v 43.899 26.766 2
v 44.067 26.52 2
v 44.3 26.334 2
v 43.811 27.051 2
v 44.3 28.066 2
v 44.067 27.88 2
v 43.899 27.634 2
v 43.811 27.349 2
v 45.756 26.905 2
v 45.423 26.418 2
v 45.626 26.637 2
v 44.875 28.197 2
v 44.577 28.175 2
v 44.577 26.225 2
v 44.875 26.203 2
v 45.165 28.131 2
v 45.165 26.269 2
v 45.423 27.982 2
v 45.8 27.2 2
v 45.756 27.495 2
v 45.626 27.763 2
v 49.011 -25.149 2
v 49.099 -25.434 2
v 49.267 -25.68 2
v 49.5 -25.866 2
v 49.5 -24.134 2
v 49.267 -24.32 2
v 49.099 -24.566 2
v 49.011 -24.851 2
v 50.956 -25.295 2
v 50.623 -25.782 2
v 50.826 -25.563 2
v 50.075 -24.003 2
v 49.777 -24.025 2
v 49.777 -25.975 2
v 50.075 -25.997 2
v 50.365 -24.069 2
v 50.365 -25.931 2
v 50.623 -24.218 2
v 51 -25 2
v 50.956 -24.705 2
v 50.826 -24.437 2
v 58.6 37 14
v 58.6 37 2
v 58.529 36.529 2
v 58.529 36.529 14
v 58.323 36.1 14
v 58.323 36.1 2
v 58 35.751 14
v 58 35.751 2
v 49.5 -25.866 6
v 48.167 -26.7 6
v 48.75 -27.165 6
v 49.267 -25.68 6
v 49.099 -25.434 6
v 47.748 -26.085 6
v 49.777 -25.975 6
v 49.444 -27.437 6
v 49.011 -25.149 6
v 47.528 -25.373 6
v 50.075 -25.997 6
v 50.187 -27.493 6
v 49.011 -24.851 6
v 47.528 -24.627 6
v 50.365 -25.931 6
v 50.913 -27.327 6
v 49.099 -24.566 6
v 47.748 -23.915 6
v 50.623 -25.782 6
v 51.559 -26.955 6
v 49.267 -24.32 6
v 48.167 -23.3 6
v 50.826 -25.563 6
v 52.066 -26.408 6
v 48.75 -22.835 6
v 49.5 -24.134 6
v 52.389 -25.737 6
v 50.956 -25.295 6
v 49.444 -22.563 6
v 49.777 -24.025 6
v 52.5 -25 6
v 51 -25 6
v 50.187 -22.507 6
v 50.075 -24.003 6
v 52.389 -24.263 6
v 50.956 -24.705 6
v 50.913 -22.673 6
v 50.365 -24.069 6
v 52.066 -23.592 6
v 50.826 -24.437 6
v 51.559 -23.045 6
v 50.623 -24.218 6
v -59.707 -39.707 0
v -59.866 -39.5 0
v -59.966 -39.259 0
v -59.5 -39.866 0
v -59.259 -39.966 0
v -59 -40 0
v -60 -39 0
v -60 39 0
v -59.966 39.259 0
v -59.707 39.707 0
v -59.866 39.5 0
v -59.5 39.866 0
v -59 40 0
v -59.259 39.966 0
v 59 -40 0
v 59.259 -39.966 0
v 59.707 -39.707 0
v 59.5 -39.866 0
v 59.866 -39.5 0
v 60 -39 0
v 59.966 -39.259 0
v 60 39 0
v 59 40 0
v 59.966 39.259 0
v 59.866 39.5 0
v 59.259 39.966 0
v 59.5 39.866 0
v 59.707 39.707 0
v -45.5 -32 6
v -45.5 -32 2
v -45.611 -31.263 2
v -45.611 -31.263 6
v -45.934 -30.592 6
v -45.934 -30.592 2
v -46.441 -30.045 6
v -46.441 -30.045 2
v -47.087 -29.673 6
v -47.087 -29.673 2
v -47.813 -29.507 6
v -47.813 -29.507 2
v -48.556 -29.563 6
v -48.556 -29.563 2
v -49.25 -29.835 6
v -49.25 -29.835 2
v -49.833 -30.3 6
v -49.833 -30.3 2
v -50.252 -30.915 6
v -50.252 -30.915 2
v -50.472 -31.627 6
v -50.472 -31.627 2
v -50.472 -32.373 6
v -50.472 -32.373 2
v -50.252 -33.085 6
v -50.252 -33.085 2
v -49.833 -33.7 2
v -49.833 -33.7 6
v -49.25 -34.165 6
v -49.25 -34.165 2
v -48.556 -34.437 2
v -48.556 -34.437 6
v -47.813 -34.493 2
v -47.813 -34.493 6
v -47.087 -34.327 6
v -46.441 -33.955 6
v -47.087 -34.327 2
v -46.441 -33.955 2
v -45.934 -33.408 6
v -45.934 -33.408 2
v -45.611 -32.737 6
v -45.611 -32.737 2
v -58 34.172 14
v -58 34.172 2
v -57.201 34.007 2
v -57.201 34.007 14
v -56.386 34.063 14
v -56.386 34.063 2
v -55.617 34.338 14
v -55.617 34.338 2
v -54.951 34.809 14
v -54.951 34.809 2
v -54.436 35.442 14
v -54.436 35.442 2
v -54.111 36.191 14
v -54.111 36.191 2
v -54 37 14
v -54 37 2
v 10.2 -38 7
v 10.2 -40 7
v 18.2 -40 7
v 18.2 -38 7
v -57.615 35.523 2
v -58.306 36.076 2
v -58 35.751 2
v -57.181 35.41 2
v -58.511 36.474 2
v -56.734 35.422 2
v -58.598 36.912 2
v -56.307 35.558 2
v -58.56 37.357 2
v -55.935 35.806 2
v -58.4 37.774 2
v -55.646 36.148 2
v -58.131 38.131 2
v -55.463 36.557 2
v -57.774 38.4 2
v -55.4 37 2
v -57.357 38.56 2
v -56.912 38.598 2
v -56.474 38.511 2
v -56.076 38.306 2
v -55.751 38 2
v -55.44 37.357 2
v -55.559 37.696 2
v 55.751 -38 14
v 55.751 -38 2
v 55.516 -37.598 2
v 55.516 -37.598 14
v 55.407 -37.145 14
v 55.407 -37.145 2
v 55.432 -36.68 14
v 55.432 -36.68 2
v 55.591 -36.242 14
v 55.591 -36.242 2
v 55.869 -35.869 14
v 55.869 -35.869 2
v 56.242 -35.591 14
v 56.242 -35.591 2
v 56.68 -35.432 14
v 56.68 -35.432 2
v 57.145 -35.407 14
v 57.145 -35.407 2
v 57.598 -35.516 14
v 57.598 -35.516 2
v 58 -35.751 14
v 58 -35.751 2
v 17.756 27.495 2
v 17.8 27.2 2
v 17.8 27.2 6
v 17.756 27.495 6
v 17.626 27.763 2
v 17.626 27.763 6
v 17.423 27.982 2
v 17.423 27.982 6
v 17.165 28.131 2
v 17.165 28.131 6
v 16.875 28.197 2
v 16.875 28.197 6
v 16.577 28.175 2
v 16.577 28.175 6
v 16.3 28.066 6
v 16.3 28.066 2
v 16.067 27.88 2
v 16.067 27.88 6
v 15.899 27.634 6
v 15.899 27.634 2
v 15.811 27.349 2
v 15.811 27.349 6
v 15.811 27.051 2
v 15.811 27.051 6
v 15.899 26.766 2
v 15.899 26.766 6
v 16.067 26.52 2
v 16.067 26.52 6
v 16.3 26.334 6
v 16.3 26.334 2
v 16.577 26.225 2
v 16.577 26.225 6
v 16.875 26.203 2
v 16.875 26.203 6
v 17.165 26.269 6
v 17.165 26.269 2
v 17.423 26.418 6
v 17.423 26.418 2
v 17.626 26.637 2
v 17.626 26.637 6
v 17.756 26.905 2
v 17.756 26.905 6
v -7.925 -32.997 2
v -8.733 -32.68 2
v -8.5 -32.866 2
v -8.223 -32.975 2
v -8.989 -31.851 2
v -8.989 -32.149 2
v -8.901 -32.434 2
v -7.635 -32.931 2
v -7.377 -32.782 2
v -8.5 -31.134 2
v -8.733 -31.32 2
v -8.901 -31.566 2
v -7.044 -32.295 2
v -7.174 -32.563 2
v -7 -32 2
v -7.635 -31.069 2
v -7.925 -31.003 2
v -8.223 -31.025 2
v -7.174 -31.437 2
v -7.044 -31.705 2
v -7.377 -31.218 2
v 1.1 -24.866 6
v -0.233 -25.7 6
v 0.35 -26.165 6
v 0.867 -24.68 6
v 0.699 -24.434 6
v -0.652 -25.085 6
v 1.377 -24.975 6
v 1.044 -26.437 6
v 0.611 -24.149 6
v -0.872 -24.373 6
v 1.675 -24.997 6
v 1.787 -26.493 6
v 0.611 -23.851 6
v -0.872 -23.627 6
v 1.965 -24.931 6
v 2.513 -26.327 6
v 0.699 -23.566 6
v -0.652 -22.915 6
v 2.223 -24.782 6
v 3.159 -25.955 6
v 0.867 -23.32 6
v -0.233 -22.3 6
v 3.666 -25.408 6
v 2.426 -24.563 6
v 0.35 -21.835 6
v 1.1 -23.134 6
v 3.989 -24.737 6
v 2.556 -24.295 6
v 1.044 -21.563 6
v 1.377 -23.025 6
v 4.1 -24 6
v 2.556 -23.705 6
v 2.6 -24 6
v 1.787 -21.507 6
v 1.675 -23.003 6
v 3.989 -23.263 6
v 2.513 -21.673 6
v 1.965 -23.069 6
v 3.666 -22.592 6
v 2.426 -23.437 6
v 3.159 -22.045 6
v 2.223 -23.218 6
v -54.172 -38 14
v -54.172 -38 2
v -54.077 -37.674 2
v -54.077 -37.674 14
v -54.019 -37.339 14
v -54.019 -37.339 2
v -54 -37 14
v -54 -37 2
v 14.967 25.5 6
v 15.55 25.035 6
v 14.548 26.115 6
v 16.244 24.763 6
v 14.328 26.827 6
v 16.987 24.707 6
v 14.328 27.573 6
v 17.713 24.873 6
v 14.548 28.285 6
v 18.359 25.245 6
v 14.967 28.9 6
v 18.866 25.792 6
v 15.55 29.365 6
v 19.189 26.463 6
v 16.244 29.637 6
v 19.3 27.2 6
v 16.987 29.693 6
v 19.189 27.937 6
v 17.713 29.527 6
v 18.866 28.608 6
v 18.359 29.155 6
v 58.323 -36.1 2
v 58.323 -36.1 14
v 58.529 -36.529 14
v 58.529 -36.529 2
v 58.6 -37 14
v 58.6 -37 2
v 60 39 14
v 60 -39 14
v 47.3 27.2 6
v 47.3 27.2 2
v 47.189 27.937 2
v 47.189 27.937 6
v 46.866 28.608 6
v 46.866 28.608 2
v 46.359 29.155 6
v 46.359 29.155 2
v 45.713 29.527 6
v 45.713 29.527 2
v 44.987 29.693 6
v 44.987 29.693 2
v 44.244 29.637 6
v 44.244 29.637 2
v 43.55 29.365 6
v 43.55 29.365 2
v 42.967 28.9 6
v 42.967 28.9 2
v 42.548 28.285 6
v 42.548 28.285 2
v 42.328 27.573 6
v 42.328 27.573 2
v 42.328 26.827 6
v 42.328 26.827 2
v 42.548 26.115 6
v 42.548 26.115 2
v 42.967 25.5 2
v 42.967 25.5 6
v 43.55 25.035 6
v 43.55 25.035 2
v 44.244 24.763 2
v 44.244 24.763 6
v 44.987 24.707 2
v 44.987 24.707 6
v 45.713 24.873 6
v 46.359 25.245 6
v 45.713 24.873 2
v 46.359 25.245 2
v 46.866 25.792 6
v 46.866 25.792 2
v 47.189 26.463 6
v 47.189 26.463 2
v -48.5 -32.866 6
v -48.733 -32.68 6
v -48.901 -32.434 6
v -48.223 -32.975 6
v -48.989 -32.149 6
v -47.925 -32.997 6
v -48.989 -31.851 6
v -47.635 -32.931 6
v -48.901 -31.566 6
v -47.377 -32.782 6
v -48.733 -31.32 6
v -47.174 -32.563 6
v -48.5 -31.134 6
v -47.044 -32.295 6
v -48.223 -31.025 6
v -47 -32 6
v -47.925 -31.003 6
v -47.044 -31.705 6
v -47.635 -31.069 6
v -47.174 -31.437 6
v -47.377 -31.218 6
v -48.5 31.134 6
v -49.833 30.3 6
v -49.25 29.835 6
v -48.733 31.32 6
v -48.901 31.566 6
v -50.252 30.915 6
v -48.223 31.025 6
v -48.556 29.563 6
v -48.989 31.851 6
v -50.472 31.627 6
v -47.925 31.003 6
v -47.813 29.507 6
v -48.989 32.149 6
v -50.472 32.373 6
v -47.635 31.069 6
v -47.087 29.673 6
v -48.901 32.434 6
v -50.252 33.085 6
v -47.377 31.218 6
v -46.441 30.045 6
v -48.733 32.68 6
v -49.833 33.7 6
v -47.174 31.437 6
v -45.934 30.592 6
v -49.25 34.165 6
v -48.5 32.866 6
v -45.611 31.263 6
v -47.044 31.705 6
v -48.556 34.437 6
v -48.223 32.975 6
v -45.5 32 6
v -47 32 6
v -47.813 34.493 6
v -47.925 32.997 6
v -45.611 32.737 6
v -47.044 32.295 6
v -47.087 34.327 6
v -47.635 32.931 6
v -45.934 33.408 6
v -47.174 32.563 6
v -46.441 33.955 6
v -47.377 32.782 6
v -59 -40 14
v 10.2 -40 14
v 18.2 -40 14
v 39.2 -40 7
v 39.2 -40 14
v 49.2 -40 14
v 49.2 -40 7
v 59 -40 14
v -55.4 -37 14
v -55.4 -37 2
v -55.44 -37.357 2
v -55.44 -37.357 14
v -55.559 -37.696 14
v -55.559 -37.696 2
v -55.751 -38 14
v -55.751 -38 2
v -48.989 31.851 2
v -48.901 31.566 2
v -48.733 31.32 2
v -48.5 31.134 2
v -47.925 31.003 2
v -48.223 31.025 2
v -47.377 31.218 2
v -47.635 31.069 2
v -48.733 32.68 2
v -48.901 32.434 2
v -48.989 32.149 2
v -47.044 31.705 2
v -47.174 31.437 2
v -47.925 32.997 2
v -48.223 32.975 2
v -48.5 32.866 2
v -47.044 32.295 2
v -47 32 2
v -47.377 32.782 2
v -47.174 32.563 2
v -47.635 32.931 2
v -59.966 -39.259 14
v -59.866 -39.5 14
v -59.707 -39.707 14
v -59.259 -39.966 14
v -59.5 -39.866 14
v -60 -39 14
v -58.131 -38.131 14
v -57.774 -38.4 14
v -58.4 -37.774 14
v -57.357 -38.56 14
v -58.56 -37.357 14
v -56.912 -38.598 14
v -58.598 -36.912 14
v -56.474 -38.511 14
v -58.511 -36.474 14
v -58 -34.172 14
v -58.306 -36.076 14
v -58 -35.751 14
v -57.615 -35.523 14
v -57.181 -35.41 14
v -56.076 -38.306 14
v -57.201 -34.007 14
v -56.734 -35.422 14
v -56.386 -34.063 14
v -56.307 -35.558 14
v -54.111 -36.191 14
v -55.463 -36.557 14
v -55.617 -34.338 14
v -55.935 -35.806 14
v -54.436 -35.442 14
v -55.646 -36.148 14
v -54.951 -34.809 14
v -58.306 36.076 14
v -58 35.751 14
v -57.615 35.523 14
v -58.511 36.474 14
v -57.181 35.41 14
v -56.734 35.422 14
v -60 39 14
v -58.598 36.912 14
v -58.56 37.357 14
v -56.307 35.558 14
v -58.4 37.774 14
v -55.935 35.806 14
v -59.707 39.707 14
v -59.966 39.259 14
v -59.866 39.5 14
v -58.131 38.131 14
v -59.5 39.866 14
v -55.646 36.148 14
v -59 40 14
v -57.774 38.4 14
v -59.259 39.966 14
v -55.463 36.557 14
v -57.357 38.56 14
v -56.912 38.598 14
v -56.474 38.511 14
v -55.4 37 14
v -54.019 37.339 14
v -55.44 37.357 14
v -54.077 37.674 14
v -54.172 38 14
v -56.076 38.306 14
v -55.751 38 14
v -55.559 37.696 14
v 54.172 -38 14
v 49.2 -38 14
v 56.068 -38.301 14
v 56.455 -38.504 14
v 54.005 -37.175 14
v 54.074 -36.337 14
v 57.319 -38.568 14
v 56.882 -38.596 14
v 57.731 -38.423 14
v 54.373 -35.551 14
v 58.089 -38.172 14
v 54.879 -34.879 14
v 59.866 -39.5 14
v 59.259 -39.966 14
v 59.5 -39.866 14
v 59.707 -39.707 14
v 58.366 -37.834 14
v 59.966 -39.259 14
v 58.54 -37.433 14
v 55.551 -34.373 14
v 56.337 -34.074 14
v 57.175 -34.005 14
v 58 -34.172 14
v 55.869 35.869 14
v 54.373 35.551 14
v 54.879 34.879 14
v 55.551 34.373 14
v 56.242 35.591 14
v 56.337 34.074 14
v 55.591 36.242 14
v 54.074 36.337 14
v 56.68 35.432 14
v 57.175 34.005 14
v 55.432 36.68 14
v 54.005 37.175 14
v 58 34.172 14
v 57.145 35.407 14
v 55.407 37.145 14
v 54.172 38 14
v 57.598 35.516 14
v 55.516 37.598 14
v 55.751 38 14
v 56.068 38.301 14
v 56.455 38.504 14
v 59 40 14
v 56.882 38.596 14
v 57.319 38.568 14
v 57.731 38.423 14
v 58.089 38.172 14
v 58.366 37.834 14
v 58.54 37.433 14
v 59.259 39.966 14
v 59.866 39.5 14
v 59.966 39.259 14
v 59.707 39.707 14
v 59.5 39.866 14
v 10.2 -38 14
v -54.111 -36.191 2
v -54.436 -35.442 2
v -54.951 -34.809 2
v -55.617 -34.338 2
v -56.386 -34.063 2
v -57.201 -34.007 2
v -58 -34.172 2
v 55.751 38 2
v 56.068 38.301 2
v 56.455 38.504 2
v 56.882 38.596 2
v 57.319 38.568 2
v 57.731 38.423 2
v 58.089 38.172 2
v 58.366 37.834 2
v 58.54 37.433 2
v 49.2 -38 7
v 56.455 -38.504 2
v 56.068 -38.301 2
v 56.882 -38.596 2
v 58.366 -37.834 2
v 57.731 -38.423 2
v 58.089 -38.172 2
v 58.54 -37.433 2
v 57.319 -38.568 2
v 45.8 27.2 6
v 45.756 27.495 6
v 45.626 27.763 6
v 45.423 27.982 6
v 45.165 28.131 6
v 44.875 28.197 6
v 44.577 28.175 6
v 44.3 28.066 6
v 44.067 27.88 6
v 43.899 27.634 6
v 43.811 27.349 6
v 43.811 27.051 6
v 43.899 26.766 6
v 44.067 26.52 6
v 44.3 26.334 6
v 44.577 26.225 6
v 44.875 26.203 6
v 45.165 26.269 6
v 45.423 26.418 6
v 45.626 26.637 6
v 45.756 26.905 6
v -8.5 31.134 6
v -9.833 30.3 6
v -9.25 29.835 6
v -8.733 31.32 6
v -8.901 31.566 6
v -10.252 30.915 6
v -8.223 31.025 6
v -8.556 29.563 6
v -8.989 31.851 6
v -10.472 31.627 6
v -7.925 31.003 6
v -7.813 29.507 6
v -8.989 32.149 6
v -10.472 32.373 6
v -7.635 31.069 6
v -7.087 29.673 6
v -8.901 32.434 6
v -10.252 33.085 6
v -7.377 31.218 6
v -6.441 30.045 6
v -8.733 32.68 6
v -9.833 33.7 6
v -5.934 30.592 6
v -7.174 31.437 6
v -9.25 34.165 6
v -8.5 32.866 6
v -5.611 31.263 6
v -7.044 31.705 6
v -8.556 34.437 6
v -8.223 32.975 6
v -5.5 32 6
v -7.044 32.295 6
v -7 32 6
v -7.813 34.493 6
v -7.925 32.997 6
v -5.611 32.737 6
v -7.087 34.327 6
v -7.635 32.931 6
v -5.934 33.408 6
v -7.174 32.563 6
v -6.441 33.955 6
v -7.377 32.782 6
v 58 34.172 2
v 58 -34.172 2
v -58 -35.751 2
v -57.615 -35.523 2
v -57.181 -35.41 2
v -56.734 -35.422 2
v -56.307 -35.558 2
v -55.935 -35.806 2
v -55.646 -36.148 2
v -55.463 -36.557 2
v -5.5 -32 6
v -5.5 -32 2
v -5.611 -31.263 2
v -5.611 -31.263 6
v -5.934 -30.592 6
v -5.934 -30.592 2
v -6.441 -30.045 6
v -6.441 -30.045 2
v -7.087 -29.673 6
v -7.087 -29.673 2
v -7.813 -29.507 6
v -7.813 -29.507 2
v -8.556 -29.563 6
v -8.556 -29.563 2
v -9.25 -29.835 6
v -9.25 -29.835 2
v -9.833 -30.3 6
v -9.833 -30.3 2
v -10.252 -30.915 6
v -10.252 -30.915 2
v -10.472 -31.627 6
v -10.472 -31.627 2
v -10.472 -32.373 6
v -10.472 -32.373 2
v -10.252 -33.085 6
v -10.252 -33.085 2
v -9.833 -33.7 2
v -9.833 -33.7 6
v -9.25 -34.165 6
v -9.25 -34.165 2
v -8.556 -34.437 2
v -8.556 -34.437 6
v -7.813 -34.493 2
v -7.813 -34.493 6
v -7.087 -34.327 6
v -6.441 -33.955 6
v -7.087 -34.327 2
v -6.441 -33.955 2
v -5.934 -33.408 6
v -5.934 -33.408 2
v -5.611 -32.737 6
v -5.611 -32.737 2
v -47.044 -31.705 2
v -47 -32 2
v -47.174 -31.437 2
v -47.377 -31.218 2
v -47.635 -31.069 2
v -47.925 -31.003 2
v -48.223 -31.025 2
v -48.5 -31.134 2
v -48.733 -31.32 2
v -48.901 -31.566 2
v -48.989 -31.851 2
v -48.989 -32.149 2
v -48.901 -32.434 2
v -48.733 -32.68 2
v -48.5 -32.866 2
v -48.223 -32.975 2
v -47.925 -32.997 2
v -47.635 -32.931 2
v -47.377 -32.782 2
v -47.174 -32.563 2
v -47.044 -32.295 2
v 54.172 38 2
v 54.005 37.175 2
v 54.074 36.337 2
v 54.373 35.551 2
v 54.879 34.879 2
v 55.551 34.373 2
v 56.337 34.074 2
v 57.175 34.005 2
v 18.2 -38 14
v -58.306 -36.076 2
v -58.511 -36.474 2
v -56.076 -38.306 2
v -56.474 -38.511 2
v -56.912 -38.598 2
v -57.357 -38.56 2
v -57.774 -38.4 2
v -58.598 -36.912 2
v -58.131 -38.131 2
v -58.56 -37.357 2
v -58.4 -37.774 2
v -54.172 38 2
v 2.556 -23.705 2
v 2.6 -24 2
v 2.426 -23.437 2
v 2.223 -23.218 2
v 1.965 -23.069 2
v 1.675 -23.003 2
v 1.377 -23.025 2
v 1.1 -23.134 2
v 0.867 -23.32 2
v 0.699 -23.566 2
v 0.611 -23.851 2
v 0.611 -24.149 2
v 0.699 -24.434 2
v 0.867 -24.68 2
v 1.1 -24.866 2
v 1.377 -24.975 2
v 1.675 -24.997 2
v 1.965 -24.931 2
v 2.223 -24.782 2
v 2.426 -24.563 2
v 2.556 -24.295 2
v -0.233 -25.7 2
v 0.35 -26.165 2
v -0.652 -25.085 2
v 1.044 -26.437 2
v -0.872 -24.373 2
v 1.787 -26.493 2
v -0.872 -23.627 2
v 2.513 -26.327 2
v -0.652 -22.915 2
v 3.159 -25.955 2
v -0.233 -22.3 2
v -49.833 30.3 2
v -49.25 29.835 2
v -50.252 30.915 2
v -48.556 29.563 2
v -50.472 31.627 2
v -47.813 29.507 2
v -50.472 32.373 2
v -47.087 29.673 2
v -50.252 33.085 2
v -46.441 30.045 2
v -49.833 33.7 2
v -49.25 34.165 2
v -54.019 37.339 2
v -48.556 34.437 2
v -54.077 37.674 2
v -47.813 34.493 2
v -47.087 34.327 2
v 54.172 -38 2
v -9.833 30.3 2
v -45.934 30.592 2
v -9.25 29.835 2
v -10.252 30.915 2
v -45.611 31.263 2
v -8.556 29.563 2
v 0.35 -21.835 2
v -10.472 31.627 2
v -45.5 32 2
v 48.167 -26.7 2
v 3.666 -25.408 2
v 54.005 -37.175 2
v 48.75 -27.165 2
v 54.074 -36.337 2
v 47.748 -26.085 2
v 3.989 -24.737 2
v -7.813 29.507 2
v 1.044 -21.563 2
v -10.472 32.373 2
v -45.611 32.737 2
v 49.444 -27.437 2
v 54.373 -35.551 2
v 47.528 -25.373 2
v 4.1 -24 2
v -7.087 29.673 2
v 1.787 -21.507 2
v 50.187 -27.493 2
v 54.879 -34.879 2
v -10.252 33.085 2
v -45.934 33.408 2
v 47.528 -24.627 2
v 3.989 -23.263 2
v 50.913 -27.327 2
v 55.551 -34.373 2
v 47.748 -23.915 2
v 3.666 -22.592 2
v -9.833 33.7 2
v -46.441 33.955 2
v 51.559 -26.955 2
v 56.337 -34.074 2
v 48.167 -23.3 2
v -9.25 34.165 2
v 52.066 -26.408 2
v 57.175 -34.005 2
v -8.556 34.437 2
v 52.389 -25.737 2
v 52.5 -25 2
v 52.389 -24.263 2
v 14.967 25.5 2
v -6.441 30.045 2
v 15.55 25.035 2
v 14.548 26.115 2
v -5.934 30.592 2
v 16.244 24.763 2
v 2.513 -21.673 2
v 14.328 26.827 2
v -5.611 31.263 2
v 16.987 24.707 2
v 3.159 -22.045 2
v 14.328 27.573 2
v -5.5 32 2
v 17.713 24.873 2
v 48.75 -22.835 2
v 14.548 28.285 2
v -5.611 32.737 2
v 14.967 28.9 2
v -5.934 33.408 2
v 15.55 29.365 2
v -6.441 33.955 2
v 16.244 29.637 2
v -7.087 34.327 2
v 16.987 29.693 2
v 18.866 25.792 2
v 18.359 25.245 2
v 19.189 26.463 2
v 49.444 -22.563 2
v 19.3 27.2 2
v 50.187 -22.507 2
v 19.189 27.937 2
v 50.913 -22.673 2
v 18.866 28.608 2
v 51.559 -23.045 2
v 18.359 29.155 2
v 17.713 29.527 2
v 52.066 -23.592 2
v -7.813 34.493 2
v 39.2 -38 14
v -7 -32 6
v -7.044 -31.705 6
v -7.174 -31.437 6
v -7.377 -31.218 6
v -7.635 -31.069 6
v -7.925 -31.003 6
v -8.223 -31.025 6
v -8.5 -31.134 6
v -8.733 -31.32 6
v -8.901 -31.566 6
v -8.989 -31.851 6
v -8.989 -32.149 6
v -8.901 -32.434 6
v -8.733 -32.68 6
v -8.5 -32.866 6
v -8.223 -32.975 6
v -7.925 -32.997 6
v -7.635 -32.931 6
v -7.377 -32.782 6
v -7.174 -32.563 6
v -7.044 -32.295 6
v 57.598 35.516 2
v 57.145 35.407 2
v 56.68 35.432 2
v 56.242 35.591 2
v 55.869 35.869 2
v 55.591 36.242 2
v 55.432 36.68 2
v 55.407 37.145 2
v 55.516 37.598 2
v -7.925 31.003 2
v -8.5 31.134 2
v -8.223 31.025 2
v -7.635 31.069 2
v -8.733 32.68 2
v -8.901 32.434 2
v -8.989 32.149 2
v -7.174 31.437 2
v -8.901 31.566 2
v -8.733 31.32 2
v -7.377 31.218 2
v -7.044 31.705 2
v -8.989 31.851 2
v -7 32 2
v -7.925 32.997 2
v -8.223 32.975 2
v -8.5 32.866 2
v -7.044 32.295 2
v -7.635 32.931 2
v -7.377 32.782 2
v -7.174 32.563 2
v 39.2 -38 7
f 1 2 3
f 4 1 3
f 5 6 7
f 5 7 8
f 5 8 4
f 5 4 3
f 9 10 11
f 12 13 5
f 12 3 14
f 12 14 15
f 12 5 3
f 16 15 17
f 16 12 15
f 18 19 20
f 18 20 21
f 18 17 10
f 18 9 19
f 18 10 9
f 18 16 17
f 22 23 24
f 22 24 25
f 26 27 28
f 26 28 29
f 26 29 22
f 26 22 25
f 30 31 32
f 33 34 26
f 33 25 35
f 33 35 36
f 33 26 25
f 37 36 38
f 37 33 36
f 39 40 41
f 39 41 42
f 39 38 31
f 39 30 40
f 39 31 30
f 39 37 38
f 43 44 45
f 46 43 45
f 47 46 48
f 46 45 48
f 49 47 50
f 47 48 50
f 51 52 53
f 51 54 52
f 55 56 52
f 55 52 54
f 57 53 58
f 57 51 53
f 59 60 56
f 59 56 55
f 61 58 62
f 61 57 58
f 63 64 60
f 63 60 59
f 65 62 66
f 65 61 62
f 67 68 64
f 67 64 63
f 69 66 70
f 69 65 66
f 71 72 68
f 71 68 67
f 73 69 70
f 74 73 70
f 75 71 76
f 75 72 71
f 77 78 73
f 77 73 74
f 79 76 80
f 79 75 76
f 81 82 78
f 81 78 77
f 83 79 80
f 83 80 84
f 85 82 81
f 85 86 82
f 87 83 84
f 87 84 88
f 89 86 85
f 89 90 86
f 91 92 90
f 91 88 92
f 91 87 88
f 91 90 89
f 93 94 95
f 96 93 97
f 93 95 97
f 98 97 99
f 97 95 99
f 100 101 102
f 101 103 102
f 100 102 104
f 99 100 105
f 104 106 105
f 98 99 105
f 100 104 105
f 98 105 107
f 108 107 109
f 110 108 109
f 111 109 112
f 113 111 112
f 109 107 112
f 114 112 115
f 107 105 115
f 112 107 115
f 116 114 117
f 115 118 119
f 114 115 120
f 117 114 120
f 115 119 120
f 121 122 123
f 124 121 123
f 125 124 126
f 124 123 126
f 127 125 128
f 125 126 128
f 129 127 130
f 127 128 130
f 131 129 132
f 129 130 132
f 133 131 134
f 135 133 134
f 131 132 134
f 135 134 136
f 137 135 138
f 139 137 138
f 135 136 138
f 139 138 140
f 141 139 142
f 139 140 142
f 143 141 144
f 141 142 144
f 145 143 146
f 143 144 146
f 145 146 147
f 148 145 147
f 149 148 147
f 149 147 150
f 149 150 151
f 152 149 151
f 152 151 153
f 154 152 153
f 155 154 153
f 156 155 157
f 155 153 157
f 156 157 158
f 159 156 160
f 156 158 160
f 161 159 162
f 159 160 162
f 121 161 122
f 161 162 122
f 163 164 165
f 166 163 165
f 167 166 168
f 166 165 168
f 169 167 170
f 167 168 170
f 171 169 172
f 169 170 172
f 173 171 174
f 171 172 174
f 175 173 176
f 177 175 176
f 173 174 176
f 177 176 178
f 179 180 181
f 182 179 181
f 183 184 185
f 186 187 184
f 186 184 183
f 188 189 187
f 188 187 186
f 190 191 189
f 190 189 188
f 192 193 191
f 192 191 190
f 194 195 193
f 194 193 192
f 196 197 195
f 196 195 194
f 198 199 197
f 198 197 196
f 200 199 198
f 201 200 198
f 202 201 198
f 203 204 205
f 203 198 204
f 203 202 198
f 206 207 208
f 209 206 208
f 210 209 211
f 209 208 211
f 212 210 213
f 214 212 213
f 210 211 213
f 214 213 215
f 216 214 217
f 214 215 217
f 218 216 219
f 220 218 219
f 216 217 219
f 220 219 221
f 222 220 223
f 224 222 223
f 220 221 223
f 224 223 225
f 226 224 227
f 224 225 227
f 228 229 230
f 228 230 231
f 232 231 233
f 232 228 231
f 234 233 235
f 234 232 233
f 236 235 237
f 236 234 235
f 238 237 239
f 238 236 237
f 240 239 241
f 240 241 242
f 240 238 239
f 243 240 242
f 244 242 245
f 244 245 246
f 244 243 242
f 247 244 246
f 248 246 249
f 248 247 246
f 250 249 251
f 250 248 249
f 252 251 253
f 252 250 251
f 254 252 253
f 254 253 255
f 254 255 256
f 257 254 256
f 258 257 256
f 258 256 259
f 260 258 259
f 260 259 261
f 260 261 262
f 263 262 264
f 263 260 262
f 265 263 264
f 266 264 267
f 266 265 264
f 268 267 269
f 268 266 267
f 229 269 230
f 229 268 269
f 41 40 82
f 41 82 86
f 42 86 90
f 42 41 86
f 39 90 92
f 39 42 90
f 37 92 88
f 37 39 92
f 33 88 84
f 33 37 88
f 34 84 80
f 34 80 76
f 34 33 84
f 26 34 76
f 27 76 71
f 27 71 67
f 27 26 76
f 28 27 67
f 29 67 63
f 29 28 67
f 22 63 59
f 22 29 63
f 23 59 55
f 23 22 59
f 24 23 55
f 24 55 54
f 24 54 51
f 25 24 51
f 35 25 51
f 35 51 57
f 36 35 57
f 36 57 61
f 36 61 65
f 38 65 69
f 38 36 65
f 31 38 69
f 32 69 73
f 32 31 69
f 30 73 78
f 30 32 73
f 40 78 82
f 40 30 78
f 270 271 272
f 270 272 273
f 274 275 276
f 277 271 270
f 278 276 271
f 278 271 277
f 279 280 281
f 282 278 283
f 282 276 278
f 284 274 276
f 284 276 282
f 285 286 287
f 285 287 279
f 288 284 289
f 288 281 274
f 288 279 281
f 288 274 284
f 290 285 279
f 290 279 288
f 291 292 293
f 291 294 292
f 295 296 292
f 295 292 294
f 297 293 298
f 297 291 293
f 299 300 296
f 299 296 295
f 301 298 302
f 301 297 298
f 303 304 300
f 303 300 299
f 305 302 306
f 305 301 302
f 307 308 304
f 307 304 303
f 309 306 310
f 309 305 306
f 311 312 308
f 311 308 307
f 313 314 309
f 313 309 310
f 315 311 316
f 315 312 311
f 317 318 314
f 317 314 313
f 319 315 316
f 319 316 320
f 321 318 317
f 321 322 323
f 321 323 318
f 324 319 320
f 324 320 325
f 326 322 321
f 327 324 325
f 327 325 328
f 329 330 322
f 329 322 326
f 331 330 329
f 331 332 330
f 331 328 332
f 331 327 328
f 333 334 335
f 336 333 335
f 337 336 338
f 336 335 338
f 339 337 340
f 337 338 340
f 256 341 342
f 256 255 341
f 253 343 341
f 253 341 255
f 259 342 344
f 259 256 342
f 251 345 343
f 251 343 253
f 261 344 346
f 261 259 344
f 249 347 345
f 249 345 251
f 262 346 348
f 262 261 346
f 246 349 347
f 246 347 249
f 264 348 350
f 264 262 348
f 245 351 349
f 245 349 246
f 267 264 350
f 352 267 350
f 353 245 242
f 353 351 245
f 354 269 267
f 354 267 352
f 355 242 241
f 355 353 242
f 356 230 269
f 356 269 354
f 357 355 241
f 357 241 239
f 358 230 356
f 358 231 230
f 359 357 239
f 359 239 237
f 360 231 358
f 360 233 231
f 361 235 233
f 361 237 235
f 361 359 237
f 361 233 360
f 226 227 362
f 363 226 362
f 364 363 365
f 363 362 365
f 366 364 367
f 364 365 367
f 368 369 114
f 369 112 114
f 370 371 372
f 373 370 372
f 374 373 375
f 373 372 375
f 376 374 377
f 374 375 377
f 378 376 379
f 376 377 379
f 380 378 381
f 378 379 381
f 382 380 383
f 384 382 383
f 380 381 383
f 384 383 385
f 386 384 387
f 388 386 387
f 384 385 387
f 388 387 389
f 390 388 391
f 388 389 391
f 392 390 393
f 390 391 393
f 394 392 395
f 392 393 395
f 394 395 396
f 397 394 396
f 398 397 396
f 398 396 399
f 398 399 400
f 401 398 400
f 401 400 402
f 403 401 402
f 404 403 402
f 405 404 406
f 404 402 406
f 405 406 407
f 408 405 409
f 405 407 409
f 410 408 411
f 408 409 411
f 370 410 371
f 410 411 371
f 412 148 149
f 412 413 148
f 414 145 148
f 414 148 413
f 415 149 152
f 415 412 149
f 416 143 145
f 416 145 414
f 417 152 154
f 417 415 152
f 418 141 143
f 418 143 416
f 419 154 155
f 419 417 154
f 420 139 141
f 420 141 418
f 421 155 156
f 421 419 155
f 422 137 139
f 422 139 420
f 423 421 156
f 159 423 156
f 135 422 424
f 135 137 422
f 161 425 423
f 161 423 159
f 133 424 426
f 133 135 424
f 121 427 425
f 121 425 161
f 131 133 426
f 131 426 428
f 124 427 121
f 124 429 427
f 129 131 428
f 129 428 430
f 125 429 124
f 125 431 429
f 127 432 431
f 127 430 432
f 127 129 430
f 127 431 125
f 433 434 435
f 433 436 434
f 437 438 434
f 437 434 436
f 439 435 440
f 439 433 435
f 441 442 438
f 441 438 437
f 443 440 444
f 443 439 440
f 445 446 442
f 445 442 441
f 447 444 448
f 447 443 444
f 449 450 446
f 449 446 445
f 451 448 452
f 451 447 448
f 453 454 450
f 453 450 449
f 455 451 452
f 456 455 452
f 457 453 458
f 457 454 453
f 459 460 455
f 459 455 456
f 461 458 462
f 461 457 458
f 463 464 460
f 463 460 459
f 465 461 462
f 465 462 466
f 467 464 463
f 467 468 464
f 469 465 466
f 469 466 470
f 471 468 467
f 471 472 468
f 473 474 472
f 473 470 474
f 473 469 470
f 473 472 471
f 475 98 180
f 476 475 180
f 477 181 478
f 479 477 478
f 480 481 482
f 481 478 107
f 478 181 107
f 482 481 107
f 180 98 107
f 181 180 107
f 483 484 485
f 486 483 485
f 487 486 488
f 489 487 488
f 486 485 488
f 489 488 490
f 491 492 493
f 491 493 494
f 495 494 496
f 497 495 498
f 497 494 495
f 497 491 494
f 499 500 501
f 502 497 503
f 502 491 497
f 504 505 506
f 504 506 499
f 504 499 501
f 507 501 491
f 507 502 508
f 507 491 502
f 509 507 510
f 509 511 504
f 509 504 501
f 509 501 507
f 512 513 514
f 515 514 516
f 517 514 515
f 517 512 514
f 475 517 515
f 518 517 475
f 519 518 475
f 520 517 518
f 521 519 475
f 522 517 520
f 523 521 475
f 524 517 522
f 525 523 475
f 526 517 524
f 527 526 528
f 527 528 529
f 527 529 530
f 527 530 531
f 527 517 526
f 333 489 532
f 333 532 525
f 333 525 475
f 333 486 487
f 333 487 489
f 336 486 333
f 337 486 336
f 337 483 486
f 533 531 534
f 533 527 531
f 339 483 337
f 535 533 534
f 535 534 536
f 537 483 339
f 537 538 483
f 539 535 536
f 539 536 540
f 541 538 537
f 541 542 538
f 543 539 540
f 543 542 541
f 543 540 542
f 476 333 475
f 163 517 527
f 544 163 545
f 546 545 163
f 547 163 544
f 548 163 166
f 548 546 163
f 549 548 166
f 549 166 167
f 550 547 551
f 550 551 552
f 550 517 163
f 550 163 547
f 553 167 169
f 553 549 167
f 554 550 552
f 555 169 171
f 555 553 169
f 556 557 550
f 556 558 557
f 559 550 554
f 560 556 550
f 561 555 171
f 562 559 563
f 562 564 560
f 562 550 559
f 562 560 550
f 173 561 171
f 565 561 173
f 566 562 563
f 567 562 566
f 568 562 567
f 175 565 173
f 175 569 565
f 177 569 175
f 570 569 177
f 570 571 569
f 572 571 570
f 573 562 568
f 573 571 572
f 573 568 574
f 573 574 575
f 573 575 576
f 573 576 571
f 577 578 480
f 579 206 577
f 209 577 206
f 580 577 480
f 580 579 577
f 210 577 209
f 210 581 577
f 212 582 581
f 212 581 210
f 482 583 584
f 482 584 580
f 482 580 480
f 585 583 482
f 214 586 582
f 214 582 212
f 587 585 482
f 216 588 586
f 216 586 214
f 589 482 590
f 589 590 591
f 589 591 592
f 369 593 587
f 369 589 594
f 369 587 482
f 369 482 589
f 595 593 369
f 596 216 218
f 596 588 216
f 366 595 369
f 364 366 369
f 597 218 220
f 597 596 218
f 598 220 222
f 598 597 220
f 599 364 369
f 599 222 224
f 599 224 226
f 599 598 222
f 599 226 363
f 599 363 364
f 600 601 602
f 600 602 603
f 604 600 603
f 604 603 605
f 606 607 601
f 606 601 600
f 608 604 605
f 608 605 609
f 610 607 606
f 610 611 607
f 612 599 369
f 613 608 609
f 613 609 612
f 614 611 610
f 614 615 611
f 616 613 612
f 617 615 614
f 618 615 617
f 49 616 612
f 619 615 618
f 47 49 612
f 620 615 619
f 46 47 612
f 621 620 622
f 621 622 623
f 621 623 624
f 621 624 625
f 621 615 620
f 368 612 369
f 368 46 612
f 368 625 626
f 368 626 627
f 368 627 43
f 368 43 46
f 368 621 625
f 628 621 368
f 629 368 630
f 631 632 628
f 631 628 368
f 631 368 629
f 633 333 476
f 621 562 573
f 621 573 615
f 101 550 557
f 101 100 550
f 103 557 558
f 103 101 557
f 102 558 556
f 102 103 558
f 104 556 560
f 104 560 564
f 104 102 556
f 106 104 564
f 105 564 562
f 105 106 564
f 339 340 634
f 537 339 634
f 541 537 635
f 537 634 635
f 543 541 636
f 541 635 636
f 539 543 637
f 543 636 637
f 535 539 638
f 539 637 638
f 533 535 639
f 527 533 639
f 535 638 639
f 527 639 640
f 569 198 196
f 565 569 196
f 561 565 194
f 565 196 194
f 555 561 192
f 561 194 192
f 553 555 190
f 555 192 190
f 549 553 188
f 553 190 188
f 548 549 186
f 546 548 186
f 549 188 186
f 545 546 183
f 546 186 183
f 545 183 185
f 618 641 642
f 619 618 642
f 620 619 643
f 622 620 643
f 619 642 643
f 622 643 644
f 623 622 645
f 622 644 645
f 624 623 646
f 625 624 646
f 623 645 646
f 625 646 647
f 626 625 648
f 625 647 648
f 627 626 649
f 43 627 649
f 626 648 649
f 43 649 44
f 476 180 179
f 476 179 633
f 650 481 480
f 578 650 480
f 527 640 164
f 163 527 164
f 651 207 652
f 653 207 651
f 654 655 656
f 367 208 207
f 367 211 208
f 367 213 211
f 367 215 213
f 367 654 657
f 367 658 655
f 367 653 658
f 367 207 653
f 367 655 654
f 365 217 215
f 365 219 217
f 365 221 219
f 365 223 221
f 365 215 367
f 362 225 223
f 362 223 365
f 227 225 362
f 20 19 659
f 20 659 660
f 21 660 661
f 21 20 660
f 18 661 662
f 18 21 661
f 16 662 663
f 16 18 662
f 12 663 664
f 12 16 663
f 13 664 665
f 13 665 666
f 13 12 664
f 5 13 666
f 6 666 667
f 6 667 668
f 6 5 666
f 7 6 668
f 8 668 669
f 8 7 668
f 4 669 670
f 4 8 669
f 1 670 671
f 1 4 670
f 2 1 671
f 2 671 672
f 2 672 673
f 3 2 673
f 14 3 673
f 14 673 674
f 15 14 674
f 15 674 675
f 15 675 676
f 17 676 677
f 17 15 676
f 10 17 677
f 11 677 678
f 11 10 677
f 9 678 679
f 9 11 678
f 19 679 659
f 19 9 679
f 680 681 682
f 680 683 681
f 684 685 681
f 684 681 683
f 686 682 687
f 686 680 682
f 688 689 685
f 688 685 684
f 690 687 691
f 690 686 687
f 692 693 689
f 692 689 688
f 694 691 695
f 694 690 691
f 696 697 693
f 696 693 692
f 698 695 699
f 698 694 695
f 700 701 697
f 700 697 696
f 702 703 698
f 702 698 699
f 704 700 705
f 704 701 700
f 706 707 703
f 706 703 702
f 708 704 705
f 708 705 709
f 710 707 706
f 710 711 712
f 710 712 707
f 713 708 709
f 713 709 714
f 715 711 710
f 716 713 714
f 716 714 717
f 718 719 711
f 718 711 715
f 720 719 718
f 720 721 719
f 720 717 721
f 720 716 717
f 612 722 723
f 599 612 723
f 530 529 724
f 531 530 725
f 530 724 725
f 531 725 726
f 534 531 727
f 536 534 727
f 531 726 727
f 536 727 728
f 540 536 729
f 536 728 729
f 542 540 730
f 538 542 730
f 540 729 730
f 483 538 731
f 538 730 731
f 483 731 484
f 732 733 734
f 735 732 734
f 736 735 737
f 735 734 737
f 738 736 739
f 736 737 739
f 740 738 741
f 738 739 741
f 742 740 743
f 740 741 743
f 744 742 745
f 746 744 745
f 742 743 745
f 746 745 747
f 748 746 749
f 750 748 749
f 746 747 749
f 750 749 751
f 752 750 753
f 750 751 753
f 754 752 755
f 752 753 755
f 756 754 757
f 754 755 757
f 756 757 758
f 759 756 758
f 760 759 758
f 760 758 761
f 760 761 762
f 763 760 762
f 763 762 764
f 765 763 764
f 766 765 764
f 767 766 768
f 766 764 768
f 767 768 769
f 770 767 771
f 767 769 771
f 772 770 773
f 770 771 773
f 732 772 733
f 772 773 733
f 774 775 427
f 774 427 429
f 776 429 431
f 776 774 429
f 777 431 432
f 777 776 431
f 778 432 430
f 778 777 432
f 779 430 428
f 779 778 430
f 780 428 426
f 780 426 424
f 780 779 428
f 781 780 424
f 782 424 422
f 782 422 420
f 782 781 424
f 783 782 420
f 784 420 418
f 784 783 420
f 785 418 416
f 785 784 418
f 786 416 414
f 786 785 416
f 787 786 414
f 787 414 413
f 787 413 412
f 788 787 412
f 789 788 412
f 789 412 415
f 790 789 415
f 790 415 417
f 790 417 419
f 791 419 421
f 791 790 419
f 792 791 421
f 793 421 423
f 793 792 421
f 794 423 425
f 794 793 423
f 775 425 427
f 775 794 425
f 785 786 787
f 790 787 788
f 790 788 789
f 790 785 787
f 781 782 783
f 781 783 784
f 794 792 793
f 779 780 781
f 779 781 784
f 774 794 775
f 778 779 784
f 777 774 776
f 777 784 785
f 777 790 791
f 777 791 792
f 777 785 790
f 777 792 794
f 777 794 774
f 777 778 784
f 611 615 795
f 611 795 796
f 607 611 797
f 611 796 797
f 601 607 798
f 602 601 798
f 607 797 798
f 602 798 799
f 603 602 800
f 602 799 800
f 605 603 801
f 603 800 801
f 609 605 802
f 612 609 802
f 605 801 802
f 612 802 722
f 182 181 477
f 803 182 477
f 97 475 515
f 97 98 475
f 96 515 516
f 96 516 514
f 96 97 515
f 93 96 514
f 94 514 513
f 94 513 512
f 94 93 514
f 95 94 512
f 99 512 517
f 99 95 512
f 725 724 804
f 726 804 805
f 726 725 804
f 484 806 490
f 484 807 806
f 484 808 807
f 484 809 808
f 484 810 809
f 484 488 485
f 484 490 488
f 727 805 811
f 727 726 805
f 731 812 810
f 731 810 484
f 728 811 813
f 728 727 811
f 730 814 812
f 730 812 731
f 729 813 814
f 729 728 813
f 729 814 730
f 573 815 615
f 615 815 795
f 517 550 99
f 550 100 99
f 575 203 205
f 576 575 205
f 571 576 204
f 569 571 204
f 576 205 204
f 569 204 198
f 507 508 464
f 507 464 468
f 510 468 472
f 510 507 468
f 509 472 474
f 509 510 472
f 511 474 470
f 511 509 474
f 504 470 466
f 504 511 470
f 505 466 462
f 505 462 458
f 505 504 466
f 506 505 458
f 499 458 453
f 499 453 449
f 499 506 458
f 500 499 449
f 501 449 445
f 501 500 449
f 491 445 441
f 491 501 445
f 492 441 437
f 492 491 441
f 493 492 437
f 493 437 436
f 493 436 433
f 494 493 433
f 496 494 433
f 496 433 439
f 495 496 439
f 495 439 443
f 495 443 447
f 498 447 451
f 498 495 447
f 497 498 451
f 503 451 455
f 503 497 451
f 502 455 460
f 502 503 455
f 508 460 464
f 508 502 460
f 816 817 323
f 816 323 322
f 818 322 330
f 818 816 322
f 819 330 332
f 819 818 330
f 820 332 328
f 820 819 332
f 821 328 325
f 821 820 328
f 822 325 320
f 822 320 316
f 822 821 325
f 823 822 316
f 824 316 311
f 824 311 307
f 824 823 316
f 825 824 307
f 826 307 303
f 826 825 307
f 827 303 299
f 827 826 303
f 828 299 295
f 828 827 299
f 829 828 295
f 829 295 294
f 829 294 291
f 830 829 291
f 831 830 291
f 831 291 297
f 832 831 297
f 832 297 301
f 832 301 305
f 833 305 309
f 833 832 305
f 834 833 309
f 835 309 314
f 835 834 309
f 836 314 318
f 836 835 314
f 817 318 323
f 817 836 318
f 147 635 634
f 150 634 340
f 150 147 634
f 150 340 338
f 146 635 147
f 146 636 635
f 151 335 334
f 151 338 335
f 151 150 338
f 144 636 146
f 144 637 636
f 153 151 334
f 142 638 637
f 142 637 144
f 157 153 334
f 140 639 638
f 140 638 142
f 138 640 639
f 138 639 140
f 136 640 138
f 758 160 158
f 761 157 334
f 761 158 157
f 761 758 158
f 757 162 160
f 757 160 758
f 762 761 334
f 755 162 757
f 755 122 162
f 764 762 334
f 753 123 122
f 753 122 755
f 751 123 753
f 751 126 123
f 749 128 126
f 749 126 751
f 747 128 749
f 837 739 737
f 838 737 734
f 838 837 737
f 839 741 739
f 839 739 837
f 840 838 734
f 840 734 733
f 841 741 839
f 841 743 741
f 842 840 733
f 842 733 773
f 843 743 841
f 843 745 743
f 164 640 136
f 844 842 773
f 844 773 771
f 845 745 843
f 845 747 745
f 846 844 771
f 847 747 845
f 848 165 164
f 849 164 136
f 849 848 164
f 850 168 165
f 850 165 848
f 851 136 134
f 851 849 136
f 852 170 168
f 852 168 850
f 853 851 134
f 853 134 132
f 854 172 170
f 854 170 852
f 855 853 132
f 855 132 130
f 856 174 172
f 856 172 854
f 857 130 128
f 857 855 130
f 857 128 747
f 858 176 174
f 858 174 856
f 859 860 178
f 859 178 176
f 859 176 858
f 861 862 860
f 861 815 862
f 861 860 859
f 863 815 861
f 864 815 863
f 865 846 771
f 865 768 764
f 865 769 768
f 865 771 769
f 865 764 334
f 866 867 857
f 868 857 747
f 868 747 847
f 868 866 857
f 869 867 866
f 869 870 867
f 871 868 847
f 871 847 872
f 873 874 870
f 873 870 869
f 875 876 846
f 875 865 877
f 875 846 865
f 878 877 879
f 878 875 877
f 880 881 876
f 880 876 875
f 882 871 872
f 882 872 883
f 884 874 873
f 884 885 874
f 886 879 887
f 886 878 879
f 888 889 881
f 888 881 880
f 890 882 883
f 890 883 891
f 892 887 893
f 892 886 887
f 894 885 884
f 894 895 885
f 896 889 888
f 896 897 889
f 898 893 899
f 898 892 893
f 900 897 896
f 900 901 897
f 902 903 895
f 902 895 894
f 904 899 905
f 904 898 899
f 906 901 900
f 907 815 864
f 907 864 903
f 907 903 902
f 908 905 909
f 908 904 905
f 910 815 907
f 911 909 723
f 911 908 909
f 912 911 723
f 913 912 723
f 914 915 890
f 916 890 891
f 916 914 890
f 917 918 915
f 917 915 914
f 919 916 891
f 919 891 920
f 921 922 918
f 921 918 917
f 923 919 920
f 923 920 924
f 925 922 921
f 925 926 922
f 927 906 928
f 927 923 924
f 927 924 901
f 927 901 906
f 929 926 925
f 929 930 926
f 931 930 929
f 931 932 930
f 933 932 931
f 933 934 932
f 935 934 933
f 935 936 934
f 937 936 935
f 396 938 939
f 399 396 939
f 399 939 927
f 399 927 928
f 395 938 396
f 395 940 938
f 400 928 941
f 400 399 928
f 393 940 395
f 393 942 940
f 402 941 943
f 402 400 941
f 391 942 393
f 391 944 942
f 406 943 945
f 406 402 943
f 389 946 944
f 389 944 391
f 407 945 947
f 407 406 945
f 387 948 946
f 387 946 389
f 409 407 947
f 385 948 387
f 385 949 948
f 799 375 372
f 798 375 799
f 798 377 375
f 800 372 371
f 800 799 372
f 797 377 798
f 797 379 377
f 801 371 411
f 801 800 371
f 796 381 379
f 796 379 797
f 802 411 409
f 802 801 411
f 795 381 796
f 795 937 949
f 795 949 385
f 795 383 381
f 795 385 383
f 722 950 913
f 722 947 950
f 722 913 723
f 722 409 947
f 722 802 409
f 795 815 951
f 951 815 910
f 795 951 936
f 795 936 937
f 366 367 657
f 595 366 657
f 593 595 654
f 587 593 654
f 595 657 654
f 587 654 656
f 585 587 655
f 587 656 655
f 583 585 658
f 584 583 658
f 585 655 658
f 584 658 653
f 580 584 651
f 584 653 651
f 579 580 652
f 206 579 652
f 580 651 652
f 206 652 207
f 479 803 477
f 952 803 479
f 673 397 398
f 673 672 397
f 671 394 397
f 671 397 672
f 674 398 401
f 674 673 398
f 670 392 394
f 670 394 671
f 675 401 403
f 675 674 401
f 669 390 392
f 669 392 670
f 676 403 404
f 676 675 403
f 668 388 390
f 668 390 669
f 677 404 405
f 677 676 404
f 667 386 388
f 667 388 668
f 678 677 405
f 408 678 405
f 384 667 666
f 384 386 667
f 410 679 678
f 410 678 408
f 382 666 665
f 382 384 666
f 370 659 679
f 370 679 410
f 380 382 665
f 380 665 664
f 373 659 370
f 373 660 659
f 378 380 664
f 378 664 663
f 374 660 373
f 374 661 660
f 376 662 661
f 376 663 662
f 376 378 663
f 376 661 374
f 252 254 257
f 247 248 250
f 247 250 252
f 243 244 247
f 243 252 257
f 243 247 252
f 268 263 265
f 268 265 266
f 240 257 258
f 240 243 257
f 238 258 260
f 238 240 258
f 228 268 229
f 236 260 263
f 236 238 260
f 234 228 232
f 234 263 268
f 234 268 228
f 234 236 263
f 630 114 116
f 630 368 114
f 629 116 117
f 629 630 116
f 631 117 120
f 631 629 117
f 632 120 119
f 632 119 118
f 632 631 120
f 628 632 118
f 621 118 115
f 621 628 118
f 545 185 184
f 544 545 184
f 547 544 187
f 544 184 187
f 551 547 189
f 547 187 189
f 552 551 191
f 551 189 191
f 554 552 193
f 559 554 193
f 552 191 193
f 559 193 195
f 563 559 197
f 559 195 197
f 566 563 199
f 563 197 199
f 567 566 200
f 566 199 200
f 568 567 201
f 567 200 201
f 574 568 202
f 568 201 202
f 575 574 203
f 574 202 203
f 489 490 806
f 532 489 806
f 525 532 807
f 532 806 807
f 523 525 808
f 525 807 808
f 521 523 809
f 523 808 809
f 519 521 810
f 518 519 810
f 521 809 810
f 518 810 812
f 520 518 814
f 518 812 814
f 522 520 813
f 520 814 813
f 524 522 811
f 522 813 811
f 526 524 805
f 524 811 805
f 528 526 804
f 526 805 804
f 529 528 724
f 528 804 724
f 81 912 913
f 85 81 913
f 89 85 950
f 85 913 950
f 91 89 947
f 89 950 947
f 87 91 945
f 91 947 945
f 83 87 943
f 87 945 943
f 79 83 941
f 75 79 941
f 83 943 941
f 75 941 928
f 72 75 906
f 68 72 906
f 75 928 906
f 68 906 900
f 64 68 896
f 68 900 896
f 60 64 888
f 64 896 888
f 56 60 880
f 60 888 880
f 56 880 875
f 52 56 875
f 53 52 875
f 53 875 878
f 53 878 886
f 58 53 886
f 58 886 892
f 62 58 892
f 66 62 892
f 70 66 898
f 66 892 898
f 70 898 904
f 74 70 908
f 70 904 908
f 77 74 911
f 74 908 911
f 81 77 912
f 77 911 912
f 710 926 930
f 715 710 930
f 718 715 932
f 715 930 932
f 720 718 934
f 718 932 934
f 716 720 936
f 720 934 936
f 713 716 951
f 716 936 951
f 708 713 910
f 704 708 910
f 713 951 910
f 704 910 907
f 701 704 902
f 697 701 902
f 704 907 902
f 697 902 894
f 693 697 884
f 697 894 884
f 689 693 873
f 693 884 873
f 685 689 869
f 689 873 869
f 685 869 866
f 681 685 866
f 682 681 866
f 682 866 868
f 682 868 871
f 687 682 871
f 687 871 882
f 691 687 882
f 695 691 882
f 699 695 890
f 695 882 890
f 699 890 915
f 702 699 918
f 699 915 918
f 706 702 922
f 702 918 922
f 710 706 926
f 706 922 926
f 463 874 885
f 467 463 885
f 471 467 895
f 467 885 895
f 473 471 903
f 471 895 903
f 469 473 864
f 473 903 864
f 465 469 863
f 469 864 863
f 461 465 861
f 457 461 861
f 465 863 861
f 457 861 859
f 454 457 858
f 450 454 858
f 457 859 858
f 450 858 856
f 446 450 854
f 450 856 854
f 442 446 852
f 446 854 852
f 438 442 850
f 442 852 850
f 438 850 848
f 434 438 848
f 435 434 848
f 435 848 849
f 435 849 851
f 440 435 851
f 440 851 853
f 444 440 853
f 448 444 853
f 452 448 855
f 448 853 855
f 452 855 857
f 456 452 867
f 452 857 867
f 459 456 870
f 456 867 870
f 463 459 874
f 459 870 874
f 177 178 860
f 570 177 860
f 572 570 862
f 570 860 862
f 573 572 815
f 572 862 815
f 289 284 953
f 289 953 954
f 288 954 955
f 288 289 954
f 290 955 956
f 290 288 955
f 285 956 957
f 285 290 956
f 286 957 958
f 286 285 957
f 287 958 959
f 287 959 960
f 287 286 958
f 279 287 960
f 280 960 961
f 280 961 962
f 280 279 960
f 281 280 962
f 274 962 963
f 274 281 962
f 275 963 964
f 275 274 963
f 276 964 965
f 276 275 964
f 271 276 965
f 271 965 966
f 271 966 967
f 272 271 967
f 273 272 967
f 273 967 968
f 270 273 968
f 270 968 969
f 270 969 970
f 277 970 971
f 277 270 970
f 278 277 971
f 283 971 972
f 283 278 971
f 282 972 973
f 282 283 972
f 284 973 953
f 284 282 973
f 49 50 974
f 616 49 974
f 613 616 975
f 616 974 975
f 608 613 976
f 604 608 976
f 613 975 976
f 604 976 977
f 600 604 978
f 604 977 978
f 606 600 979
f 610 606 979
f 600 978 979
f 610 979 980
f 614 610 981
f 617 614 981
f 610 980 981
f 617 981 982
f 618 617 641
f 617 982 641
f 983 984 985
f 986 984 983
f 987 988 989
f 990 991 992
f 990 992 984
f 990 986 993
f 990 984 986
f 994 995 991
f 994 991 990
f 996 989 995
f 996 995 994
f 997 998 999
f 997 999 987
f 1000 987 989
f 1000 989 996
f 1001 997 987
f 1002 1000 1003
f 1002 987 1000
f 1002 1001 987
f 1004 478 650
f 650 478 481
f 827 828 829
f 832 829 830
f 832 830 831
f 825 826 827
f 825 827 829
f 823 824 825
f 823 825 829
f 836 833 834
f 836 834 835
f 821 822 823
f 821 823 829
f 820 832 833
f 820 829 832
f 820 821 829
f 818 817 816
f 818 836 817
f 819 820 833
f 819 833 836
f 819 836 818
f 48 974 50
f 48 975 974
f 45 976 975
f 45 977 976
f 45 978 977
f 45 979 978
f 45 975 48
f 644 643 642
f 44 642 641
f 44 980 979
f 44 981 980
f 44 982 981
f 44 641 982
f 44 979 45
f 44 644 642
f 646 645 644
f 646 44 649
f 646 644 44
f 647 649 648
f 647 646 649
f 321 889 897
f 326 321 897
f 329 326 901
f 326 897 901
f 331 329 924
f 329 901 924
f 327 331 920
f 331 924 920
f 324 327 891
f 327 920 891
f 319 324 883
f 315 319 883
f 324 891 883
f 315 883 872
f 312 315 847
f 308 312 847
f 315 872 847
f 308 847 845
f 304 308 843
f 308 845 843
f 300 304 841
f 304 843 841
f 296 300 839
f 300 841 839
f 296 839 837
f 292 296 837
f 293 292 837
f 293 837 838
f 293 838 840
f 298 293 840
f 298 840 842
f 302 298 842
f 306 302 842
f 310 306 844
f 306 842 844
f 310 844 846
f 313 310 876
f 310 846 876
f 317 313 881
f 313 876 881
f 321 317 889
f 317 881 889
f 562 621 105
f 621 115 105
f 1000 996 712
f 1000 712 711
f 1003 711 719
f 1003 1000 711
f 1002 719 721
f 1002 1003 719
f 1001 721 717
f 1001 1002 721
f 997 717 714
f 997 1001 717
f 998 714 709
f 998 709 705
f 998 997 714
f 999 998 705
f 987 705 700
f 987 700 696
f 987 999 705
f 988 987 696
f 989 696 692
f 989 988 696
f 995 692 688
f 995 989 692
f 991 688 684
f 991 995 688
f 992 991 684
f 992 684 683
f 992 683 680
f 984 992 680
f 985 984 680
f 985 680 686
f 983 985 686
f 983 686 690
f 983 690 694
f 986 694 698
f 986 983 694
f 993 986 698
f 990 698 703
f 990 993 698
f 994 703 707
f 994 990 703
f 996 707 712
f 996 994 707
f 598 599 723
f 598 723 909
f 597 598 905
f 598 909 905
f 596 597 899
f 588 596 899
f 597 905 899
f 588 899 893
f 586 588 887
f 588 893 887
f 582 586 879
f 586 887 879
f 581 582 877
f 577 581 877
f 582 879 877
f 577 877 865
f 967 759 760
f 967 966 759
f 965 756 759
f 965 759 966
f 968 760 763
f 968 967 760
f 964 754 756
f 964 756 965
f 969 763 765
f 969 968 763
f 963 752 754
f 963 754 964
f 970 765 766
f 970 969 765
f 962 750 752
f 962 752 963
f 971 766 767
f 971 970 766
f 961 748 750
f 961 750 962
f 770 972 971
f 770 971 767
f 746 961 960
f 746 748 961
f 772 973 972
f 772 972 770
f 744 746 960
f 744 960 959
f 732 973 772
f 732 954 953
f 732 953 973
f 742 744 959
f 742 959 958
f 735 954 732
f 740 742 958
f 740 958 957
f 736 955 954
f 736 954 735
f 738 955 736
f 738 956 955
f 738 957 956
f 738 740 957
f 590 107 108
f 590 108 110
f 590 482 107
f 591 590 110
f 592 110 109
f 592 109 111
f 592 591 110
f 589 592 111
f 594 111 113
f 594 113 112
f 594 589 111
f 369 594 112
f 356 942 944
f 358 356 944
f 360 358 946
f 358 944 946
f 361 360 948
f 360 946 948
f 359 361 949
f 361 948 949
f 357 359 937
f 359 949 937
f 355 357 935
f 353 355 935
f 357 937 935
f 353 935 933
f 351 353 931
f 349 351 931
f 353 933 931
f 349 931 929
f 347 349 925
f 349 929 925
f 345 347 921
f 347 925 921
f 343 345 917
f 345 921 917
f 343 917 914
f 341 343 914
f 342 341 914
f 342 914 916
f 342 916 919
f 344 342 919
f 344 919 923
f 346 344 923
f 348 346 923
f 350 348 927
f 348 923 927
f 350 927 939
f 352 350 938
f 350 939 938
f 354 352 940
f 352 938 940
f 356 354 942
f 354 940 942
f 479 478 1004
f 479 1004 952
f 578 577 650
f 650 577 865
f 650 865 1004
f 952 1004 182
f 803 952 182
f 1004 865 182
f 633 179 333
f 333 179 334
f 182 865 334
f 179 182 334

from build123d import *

# Parameters (mm, degrees)
F0_W     = 120
F0_H     = 80
F1_DEPTH = 2
F3_DEPTH = 12
F4_R     = 2.5
F4_R_2   = 1
F5_DEPTH = 4
F6_W     = 8
F6_H     = 7
F6_W_2   = 10
F7_DEPTH = 3
F8_R     = 1


with BuildPart() as f1:
    # F0 (on Top) → F1 (new body)
    with BuildSketch(Plane.XY):
        Rectangle(F0_W, F0_H)
    extrude(amount=F1_DEPTH)

    # F2 (on face) → F3 (join)
    with BuildSketch(Plane.XY.offset(2)):
        with BuildLine():
            Line((-58, -34.1715728753), (-58, 34.1715728753))
            ThreePointArc((-58, 34.1715728753), (-59.4494897428, 35.2679491924), (-60, 37))
            Line((-60, 37), (-60, -37))
            ThreePointArc((-60, -37), (-59.4494897428, -35.2679491924), (-58, -34.1715728753))
        make_face()
        with BuildLine():
            ThreePointArc((-57, -40), (-59.1213203436, -39.1213203436), (-60, -37))
            Line((-60, -37), (-60, -40))
            Line((-60, -40), (-57, -40))
        make_face()
        with BuildLine():
            ThreePointArc((-57, -40), (-55.2679491924, -39.4494897428), (-54.1715728753, -38))
            Line((-54.1715728753, -38), (-55.7510004003, -38))
            ThreePointArc((-55.7510004003, -38), (-58.1313708499, -38.1313708499), (-58, -35.7510004003))
            Line((-58, -35.7510004003), (-58, -34.1715728753))
            ThreePointArc((-58, -34.1715728753), (-59.4494897428, -35.2679491924), (-60, -37))
            ThreePointArc((-60, -37), (-59.1213203436, -39.1213203436), (-57, -40))
        make_face()
        with BuildLine():
            Line((-55.7510004003, -38), (-54.1715728753, -38))
            ThreePointArc((-54.1715728753, -38), (-54.043204321, -37.5073059362), (-54, -37))
            ThreePointArc((-54, -37), (-55.2679491924, -34.5505102572), (-58, -34.1715728753))
            Line((-58, -34.1715728753), (-58, -35.7510004003))
            ThreePointArc((-58, -35.7510004003), (-56.307179677, -35.5577794898), (-55.4, -37))
            ThreePointArc((-55.4, -37), (-55.4902981487, -37.5299059542), (-55.7510004003, -38))
        make_face()
        with BuildLine():
            ThreePointArc((57, -40), (55.2679491924, -39.4494897428), (54.1715728753, -38))
            Line((54.1715728753, -38), (-54.1715728753, -38))
            ThreePointArc((-54.1715728753, -38), (-55.2679491924, -39.4494897428), (-57, -40))
            Line((-57, -40), (57, -40))
        make_face()
        with BuildLine():
            Line((58, -35.7510004003), (58, -34.1715728753))
            ThreePointArc((58, -34.1715728753), (54.8786796564, -34.8786796564), (54.1715728753, -38))
            Line((54.1715728753, -38), (55.7510004003, -38))
            ThreePointArc((55.7510004003, -38), (55.8686291501, -35.8686291501), (58, -35.7510004003))
        make_face()
        with BuildLine():
            ThreePointArc((60, -37), (59.4494897428, -35.2679491924), (58, -34.1715728753))
            Line((58, -34.1715728753), (58, -35.7510004003))
            ThreePointArc((58, -35.7510004003), (58.4422205102, -36.307179677), (58.6, -37))
            ThreePointArc((58.6, -37), (57.5299059542, -38.5097018513), (55.7510004003, -38))
            Line((55.7510004003, -38), (54.1715728753, -38))
            ThreePointArc((54.1715728753, -38), (55.2679491924, -39.4494897428), (57, -40))
            ThreePointArc((57, -40), (59.1213203436, -39.1213203436), (60, -37))
        make_face()
        with BuildLine():
            Line((60, -40), (60, -37))
            ThreePointArc((60, -37), (59.1213203436, -39.1213203436), (57, -40))
            Line((57, -40), (60, -40))
        make_face()
        with BuildLine():
            ThreePointArc((60, 37), (59.4494897428, 35.2679491924), (58, 34.1715728753))
            Line((58, 34.1715728753), (58, -34.1715728753))
            ThreePointArc((58, -34.1715728753), (59.4494897428, -35.2679491924), (60, -37))
            Line((60, -37), (60, 37))
        make_face()
        with BuildLine():
            ThreePointArc((58, 35.7510004003), (55.8686291501, 35.8686291501), (55.7510004003, 38))
            Line((55.7510004003, 38), (54.1715728753, 38))
            ThreePointArc((54.1715728753, 38), (54.8786796564, 34.8786796564), (58, 34.1715728753))
            Line((58, 34.1715728753), (58, 35.7510004003))
        make_face()
        with BuildLine():
            Line((-54.1715728753, 38), (54.1715728753, 38))
            ThreePointArc((54.1715728753, 38), (55.2679491924, 39.4494897428), (57, 40))
            Line((57, 40), (-57, 40))
            ThreePointArc((-57, 40), (-55.2679491924, 39.4494897428), (-54.1715728753, 38))
        make_face()
        with BuildLine():
            Line((54.1715728753, 38), (55.7510004003, 38))
            ThreePointArc((55.7510004003, 38), (57.5299059542, 38.5097018513), (58.6, 37))
            ThreePointArc((58.6, 37), (58.4422205102, 36.307179677), (58, 35.7510004003))
            Line((58, 35.7510004003), (58, 34.1715728753))
            ThreePointArc((58, 34.1715728753), (59.4494897428, 35.2679491924), (60, 37))
            ThreePointArc((60, 37), (59.1213203436, 39.1213203436), (57, 40))
            ThreePointArc((57, 40), (55.2679491924, 39.4494897428), (54.1715728753, 38))
        make_face()
        with BuildLine():
            Line((60, 40), (57, 40))
            ThreePointArc((57, 40), (59.1213203436, 39.1213203436), (60, 37))
            Line((60, 37), (60, 40))
        make_face()
        with BuildLine():
            ThreePointArc((-60, 37), (-59.1213203436, 39.1213203436), (-57, 40))
            Line((-57, 40), (-60, 40))
            Line((-60, 40), (-60, 37))
        make_face()
        with BuildLine():
            Line((-55.7510004003, 38), (-54.1715728753, 38))
            ThreePointArc((-54.1715728753, 38), (-55.2679491924, 39.4494897428), (-57, 40))
            ThreePointArc((-57, 40), (-59.1213203436, 39.1213203436), (-60, 37))
            ThreePointArc((-60, 37), (-59.4494897428, 35.2679491924), (-58, 34.1715728753))
            Line((-58, 34.1715728753), (-58, 35.7510004003))
            ThreePointArc((-58, 35.7510004003), (-58.1313708499, 38.1313708499), (-55.7510004003, 38))
        make_face()
        with BuildLine():
            ThreePointArc((-54, 37), (-54.043204321, 37.5073059362), (-54.1715728753, 38))
            Line((-54.1715728753, 38), (-55.7510004003, 38))
            ThreePointArc((-55.7510004003, 38), (-55.4902981487, 37.5299059542), (-55.4, 37))
            ThreePointArc((-55.4, 37), (-56.307179677, 35.5577794898), (-58, 35.7510004003))
            Line((-58, 35.7510004003), (-58, 34.1715728753))
            ThreePointArc((-58, 34.1715728753), (-55.2679491924, 34.5505102572), (-54, 37))
        make_face()
    extrude(amount=F3_DEPTH)

    # F4 (on face) → F5 (join)
    with BuildSketch(Plane.XY.offset(2)):
        with Locations((50, -25)):
            Circle(F4_R)
        with Locations((50, -25)):
            Circle(F4_R_2, mode=Mode.SUBTRACT)
        with Locations((1.6, -24)):
            Circle(F4_R)
        with Locations((1.6, -24)):
            Circle(F4_R_2, mode=Mode.SUBTRACT)
        with Locations((44.8, 27.2)):
            Circle(F4_R)
        with Locations((44.8, 27.2)):
            Circle(F4_R_2, mode=Mode.SUBTRACT)
        with Locations((16.8, 27.2)):
            Circle(F4_R)
        with Locations((16.8, 27.2)):
            Circle(F4_R_2, mode=Mode.SUBTRACT)
        with Locations((-48, 32)):
            Circle(F4_R)
        with Locations((-48, 32)):
            Circle(F4_R_2, mode=Mode.SUBTRACT)
        with Locations((-8, 32)):
            Circle(F4_R)
        with Locations((-8, 32)):
            Circle(F4_R_2, mode=Mode.SUBTRACT)
        with Locations((-8, -32)):
            Circle(F4_R)
        with Locations((-8, -32)):
            Circle(F4_R_2, mode=Mode.SUBTRACT)
        with Locations((-48, -32)):
            Circle(F4_R)
        with Locations((-48, -32)):
            Circle(F4_R_2, mode=Mode.SUBTRACT)
    extrude(amount=F5_DEPTH)

    # F6 (on face) → F7 (cut)
    with BuildSketch(Plane.XZ.offset(40)):
        with Locations((14.2, 10.5)):
            Rectangle(F6_W, F6_H)
        with Locations((44.2, 10.5)):
            Rectangle(F6_W_2, F6_H)
    extrude(amount=-F7_DEPTH, mode=Mode.SUBTRACT)

    # F8
    f8_edges = [f1.edges().sort_by_distance(p)[0] for p in [
        (60, -40, 7),
        (60, 40, 7),
        (-60, -40, 7),
        (-60, 40, 7),
    ]]
    fillet(f8_edges, radius=F8_R)


solid = f1.part
